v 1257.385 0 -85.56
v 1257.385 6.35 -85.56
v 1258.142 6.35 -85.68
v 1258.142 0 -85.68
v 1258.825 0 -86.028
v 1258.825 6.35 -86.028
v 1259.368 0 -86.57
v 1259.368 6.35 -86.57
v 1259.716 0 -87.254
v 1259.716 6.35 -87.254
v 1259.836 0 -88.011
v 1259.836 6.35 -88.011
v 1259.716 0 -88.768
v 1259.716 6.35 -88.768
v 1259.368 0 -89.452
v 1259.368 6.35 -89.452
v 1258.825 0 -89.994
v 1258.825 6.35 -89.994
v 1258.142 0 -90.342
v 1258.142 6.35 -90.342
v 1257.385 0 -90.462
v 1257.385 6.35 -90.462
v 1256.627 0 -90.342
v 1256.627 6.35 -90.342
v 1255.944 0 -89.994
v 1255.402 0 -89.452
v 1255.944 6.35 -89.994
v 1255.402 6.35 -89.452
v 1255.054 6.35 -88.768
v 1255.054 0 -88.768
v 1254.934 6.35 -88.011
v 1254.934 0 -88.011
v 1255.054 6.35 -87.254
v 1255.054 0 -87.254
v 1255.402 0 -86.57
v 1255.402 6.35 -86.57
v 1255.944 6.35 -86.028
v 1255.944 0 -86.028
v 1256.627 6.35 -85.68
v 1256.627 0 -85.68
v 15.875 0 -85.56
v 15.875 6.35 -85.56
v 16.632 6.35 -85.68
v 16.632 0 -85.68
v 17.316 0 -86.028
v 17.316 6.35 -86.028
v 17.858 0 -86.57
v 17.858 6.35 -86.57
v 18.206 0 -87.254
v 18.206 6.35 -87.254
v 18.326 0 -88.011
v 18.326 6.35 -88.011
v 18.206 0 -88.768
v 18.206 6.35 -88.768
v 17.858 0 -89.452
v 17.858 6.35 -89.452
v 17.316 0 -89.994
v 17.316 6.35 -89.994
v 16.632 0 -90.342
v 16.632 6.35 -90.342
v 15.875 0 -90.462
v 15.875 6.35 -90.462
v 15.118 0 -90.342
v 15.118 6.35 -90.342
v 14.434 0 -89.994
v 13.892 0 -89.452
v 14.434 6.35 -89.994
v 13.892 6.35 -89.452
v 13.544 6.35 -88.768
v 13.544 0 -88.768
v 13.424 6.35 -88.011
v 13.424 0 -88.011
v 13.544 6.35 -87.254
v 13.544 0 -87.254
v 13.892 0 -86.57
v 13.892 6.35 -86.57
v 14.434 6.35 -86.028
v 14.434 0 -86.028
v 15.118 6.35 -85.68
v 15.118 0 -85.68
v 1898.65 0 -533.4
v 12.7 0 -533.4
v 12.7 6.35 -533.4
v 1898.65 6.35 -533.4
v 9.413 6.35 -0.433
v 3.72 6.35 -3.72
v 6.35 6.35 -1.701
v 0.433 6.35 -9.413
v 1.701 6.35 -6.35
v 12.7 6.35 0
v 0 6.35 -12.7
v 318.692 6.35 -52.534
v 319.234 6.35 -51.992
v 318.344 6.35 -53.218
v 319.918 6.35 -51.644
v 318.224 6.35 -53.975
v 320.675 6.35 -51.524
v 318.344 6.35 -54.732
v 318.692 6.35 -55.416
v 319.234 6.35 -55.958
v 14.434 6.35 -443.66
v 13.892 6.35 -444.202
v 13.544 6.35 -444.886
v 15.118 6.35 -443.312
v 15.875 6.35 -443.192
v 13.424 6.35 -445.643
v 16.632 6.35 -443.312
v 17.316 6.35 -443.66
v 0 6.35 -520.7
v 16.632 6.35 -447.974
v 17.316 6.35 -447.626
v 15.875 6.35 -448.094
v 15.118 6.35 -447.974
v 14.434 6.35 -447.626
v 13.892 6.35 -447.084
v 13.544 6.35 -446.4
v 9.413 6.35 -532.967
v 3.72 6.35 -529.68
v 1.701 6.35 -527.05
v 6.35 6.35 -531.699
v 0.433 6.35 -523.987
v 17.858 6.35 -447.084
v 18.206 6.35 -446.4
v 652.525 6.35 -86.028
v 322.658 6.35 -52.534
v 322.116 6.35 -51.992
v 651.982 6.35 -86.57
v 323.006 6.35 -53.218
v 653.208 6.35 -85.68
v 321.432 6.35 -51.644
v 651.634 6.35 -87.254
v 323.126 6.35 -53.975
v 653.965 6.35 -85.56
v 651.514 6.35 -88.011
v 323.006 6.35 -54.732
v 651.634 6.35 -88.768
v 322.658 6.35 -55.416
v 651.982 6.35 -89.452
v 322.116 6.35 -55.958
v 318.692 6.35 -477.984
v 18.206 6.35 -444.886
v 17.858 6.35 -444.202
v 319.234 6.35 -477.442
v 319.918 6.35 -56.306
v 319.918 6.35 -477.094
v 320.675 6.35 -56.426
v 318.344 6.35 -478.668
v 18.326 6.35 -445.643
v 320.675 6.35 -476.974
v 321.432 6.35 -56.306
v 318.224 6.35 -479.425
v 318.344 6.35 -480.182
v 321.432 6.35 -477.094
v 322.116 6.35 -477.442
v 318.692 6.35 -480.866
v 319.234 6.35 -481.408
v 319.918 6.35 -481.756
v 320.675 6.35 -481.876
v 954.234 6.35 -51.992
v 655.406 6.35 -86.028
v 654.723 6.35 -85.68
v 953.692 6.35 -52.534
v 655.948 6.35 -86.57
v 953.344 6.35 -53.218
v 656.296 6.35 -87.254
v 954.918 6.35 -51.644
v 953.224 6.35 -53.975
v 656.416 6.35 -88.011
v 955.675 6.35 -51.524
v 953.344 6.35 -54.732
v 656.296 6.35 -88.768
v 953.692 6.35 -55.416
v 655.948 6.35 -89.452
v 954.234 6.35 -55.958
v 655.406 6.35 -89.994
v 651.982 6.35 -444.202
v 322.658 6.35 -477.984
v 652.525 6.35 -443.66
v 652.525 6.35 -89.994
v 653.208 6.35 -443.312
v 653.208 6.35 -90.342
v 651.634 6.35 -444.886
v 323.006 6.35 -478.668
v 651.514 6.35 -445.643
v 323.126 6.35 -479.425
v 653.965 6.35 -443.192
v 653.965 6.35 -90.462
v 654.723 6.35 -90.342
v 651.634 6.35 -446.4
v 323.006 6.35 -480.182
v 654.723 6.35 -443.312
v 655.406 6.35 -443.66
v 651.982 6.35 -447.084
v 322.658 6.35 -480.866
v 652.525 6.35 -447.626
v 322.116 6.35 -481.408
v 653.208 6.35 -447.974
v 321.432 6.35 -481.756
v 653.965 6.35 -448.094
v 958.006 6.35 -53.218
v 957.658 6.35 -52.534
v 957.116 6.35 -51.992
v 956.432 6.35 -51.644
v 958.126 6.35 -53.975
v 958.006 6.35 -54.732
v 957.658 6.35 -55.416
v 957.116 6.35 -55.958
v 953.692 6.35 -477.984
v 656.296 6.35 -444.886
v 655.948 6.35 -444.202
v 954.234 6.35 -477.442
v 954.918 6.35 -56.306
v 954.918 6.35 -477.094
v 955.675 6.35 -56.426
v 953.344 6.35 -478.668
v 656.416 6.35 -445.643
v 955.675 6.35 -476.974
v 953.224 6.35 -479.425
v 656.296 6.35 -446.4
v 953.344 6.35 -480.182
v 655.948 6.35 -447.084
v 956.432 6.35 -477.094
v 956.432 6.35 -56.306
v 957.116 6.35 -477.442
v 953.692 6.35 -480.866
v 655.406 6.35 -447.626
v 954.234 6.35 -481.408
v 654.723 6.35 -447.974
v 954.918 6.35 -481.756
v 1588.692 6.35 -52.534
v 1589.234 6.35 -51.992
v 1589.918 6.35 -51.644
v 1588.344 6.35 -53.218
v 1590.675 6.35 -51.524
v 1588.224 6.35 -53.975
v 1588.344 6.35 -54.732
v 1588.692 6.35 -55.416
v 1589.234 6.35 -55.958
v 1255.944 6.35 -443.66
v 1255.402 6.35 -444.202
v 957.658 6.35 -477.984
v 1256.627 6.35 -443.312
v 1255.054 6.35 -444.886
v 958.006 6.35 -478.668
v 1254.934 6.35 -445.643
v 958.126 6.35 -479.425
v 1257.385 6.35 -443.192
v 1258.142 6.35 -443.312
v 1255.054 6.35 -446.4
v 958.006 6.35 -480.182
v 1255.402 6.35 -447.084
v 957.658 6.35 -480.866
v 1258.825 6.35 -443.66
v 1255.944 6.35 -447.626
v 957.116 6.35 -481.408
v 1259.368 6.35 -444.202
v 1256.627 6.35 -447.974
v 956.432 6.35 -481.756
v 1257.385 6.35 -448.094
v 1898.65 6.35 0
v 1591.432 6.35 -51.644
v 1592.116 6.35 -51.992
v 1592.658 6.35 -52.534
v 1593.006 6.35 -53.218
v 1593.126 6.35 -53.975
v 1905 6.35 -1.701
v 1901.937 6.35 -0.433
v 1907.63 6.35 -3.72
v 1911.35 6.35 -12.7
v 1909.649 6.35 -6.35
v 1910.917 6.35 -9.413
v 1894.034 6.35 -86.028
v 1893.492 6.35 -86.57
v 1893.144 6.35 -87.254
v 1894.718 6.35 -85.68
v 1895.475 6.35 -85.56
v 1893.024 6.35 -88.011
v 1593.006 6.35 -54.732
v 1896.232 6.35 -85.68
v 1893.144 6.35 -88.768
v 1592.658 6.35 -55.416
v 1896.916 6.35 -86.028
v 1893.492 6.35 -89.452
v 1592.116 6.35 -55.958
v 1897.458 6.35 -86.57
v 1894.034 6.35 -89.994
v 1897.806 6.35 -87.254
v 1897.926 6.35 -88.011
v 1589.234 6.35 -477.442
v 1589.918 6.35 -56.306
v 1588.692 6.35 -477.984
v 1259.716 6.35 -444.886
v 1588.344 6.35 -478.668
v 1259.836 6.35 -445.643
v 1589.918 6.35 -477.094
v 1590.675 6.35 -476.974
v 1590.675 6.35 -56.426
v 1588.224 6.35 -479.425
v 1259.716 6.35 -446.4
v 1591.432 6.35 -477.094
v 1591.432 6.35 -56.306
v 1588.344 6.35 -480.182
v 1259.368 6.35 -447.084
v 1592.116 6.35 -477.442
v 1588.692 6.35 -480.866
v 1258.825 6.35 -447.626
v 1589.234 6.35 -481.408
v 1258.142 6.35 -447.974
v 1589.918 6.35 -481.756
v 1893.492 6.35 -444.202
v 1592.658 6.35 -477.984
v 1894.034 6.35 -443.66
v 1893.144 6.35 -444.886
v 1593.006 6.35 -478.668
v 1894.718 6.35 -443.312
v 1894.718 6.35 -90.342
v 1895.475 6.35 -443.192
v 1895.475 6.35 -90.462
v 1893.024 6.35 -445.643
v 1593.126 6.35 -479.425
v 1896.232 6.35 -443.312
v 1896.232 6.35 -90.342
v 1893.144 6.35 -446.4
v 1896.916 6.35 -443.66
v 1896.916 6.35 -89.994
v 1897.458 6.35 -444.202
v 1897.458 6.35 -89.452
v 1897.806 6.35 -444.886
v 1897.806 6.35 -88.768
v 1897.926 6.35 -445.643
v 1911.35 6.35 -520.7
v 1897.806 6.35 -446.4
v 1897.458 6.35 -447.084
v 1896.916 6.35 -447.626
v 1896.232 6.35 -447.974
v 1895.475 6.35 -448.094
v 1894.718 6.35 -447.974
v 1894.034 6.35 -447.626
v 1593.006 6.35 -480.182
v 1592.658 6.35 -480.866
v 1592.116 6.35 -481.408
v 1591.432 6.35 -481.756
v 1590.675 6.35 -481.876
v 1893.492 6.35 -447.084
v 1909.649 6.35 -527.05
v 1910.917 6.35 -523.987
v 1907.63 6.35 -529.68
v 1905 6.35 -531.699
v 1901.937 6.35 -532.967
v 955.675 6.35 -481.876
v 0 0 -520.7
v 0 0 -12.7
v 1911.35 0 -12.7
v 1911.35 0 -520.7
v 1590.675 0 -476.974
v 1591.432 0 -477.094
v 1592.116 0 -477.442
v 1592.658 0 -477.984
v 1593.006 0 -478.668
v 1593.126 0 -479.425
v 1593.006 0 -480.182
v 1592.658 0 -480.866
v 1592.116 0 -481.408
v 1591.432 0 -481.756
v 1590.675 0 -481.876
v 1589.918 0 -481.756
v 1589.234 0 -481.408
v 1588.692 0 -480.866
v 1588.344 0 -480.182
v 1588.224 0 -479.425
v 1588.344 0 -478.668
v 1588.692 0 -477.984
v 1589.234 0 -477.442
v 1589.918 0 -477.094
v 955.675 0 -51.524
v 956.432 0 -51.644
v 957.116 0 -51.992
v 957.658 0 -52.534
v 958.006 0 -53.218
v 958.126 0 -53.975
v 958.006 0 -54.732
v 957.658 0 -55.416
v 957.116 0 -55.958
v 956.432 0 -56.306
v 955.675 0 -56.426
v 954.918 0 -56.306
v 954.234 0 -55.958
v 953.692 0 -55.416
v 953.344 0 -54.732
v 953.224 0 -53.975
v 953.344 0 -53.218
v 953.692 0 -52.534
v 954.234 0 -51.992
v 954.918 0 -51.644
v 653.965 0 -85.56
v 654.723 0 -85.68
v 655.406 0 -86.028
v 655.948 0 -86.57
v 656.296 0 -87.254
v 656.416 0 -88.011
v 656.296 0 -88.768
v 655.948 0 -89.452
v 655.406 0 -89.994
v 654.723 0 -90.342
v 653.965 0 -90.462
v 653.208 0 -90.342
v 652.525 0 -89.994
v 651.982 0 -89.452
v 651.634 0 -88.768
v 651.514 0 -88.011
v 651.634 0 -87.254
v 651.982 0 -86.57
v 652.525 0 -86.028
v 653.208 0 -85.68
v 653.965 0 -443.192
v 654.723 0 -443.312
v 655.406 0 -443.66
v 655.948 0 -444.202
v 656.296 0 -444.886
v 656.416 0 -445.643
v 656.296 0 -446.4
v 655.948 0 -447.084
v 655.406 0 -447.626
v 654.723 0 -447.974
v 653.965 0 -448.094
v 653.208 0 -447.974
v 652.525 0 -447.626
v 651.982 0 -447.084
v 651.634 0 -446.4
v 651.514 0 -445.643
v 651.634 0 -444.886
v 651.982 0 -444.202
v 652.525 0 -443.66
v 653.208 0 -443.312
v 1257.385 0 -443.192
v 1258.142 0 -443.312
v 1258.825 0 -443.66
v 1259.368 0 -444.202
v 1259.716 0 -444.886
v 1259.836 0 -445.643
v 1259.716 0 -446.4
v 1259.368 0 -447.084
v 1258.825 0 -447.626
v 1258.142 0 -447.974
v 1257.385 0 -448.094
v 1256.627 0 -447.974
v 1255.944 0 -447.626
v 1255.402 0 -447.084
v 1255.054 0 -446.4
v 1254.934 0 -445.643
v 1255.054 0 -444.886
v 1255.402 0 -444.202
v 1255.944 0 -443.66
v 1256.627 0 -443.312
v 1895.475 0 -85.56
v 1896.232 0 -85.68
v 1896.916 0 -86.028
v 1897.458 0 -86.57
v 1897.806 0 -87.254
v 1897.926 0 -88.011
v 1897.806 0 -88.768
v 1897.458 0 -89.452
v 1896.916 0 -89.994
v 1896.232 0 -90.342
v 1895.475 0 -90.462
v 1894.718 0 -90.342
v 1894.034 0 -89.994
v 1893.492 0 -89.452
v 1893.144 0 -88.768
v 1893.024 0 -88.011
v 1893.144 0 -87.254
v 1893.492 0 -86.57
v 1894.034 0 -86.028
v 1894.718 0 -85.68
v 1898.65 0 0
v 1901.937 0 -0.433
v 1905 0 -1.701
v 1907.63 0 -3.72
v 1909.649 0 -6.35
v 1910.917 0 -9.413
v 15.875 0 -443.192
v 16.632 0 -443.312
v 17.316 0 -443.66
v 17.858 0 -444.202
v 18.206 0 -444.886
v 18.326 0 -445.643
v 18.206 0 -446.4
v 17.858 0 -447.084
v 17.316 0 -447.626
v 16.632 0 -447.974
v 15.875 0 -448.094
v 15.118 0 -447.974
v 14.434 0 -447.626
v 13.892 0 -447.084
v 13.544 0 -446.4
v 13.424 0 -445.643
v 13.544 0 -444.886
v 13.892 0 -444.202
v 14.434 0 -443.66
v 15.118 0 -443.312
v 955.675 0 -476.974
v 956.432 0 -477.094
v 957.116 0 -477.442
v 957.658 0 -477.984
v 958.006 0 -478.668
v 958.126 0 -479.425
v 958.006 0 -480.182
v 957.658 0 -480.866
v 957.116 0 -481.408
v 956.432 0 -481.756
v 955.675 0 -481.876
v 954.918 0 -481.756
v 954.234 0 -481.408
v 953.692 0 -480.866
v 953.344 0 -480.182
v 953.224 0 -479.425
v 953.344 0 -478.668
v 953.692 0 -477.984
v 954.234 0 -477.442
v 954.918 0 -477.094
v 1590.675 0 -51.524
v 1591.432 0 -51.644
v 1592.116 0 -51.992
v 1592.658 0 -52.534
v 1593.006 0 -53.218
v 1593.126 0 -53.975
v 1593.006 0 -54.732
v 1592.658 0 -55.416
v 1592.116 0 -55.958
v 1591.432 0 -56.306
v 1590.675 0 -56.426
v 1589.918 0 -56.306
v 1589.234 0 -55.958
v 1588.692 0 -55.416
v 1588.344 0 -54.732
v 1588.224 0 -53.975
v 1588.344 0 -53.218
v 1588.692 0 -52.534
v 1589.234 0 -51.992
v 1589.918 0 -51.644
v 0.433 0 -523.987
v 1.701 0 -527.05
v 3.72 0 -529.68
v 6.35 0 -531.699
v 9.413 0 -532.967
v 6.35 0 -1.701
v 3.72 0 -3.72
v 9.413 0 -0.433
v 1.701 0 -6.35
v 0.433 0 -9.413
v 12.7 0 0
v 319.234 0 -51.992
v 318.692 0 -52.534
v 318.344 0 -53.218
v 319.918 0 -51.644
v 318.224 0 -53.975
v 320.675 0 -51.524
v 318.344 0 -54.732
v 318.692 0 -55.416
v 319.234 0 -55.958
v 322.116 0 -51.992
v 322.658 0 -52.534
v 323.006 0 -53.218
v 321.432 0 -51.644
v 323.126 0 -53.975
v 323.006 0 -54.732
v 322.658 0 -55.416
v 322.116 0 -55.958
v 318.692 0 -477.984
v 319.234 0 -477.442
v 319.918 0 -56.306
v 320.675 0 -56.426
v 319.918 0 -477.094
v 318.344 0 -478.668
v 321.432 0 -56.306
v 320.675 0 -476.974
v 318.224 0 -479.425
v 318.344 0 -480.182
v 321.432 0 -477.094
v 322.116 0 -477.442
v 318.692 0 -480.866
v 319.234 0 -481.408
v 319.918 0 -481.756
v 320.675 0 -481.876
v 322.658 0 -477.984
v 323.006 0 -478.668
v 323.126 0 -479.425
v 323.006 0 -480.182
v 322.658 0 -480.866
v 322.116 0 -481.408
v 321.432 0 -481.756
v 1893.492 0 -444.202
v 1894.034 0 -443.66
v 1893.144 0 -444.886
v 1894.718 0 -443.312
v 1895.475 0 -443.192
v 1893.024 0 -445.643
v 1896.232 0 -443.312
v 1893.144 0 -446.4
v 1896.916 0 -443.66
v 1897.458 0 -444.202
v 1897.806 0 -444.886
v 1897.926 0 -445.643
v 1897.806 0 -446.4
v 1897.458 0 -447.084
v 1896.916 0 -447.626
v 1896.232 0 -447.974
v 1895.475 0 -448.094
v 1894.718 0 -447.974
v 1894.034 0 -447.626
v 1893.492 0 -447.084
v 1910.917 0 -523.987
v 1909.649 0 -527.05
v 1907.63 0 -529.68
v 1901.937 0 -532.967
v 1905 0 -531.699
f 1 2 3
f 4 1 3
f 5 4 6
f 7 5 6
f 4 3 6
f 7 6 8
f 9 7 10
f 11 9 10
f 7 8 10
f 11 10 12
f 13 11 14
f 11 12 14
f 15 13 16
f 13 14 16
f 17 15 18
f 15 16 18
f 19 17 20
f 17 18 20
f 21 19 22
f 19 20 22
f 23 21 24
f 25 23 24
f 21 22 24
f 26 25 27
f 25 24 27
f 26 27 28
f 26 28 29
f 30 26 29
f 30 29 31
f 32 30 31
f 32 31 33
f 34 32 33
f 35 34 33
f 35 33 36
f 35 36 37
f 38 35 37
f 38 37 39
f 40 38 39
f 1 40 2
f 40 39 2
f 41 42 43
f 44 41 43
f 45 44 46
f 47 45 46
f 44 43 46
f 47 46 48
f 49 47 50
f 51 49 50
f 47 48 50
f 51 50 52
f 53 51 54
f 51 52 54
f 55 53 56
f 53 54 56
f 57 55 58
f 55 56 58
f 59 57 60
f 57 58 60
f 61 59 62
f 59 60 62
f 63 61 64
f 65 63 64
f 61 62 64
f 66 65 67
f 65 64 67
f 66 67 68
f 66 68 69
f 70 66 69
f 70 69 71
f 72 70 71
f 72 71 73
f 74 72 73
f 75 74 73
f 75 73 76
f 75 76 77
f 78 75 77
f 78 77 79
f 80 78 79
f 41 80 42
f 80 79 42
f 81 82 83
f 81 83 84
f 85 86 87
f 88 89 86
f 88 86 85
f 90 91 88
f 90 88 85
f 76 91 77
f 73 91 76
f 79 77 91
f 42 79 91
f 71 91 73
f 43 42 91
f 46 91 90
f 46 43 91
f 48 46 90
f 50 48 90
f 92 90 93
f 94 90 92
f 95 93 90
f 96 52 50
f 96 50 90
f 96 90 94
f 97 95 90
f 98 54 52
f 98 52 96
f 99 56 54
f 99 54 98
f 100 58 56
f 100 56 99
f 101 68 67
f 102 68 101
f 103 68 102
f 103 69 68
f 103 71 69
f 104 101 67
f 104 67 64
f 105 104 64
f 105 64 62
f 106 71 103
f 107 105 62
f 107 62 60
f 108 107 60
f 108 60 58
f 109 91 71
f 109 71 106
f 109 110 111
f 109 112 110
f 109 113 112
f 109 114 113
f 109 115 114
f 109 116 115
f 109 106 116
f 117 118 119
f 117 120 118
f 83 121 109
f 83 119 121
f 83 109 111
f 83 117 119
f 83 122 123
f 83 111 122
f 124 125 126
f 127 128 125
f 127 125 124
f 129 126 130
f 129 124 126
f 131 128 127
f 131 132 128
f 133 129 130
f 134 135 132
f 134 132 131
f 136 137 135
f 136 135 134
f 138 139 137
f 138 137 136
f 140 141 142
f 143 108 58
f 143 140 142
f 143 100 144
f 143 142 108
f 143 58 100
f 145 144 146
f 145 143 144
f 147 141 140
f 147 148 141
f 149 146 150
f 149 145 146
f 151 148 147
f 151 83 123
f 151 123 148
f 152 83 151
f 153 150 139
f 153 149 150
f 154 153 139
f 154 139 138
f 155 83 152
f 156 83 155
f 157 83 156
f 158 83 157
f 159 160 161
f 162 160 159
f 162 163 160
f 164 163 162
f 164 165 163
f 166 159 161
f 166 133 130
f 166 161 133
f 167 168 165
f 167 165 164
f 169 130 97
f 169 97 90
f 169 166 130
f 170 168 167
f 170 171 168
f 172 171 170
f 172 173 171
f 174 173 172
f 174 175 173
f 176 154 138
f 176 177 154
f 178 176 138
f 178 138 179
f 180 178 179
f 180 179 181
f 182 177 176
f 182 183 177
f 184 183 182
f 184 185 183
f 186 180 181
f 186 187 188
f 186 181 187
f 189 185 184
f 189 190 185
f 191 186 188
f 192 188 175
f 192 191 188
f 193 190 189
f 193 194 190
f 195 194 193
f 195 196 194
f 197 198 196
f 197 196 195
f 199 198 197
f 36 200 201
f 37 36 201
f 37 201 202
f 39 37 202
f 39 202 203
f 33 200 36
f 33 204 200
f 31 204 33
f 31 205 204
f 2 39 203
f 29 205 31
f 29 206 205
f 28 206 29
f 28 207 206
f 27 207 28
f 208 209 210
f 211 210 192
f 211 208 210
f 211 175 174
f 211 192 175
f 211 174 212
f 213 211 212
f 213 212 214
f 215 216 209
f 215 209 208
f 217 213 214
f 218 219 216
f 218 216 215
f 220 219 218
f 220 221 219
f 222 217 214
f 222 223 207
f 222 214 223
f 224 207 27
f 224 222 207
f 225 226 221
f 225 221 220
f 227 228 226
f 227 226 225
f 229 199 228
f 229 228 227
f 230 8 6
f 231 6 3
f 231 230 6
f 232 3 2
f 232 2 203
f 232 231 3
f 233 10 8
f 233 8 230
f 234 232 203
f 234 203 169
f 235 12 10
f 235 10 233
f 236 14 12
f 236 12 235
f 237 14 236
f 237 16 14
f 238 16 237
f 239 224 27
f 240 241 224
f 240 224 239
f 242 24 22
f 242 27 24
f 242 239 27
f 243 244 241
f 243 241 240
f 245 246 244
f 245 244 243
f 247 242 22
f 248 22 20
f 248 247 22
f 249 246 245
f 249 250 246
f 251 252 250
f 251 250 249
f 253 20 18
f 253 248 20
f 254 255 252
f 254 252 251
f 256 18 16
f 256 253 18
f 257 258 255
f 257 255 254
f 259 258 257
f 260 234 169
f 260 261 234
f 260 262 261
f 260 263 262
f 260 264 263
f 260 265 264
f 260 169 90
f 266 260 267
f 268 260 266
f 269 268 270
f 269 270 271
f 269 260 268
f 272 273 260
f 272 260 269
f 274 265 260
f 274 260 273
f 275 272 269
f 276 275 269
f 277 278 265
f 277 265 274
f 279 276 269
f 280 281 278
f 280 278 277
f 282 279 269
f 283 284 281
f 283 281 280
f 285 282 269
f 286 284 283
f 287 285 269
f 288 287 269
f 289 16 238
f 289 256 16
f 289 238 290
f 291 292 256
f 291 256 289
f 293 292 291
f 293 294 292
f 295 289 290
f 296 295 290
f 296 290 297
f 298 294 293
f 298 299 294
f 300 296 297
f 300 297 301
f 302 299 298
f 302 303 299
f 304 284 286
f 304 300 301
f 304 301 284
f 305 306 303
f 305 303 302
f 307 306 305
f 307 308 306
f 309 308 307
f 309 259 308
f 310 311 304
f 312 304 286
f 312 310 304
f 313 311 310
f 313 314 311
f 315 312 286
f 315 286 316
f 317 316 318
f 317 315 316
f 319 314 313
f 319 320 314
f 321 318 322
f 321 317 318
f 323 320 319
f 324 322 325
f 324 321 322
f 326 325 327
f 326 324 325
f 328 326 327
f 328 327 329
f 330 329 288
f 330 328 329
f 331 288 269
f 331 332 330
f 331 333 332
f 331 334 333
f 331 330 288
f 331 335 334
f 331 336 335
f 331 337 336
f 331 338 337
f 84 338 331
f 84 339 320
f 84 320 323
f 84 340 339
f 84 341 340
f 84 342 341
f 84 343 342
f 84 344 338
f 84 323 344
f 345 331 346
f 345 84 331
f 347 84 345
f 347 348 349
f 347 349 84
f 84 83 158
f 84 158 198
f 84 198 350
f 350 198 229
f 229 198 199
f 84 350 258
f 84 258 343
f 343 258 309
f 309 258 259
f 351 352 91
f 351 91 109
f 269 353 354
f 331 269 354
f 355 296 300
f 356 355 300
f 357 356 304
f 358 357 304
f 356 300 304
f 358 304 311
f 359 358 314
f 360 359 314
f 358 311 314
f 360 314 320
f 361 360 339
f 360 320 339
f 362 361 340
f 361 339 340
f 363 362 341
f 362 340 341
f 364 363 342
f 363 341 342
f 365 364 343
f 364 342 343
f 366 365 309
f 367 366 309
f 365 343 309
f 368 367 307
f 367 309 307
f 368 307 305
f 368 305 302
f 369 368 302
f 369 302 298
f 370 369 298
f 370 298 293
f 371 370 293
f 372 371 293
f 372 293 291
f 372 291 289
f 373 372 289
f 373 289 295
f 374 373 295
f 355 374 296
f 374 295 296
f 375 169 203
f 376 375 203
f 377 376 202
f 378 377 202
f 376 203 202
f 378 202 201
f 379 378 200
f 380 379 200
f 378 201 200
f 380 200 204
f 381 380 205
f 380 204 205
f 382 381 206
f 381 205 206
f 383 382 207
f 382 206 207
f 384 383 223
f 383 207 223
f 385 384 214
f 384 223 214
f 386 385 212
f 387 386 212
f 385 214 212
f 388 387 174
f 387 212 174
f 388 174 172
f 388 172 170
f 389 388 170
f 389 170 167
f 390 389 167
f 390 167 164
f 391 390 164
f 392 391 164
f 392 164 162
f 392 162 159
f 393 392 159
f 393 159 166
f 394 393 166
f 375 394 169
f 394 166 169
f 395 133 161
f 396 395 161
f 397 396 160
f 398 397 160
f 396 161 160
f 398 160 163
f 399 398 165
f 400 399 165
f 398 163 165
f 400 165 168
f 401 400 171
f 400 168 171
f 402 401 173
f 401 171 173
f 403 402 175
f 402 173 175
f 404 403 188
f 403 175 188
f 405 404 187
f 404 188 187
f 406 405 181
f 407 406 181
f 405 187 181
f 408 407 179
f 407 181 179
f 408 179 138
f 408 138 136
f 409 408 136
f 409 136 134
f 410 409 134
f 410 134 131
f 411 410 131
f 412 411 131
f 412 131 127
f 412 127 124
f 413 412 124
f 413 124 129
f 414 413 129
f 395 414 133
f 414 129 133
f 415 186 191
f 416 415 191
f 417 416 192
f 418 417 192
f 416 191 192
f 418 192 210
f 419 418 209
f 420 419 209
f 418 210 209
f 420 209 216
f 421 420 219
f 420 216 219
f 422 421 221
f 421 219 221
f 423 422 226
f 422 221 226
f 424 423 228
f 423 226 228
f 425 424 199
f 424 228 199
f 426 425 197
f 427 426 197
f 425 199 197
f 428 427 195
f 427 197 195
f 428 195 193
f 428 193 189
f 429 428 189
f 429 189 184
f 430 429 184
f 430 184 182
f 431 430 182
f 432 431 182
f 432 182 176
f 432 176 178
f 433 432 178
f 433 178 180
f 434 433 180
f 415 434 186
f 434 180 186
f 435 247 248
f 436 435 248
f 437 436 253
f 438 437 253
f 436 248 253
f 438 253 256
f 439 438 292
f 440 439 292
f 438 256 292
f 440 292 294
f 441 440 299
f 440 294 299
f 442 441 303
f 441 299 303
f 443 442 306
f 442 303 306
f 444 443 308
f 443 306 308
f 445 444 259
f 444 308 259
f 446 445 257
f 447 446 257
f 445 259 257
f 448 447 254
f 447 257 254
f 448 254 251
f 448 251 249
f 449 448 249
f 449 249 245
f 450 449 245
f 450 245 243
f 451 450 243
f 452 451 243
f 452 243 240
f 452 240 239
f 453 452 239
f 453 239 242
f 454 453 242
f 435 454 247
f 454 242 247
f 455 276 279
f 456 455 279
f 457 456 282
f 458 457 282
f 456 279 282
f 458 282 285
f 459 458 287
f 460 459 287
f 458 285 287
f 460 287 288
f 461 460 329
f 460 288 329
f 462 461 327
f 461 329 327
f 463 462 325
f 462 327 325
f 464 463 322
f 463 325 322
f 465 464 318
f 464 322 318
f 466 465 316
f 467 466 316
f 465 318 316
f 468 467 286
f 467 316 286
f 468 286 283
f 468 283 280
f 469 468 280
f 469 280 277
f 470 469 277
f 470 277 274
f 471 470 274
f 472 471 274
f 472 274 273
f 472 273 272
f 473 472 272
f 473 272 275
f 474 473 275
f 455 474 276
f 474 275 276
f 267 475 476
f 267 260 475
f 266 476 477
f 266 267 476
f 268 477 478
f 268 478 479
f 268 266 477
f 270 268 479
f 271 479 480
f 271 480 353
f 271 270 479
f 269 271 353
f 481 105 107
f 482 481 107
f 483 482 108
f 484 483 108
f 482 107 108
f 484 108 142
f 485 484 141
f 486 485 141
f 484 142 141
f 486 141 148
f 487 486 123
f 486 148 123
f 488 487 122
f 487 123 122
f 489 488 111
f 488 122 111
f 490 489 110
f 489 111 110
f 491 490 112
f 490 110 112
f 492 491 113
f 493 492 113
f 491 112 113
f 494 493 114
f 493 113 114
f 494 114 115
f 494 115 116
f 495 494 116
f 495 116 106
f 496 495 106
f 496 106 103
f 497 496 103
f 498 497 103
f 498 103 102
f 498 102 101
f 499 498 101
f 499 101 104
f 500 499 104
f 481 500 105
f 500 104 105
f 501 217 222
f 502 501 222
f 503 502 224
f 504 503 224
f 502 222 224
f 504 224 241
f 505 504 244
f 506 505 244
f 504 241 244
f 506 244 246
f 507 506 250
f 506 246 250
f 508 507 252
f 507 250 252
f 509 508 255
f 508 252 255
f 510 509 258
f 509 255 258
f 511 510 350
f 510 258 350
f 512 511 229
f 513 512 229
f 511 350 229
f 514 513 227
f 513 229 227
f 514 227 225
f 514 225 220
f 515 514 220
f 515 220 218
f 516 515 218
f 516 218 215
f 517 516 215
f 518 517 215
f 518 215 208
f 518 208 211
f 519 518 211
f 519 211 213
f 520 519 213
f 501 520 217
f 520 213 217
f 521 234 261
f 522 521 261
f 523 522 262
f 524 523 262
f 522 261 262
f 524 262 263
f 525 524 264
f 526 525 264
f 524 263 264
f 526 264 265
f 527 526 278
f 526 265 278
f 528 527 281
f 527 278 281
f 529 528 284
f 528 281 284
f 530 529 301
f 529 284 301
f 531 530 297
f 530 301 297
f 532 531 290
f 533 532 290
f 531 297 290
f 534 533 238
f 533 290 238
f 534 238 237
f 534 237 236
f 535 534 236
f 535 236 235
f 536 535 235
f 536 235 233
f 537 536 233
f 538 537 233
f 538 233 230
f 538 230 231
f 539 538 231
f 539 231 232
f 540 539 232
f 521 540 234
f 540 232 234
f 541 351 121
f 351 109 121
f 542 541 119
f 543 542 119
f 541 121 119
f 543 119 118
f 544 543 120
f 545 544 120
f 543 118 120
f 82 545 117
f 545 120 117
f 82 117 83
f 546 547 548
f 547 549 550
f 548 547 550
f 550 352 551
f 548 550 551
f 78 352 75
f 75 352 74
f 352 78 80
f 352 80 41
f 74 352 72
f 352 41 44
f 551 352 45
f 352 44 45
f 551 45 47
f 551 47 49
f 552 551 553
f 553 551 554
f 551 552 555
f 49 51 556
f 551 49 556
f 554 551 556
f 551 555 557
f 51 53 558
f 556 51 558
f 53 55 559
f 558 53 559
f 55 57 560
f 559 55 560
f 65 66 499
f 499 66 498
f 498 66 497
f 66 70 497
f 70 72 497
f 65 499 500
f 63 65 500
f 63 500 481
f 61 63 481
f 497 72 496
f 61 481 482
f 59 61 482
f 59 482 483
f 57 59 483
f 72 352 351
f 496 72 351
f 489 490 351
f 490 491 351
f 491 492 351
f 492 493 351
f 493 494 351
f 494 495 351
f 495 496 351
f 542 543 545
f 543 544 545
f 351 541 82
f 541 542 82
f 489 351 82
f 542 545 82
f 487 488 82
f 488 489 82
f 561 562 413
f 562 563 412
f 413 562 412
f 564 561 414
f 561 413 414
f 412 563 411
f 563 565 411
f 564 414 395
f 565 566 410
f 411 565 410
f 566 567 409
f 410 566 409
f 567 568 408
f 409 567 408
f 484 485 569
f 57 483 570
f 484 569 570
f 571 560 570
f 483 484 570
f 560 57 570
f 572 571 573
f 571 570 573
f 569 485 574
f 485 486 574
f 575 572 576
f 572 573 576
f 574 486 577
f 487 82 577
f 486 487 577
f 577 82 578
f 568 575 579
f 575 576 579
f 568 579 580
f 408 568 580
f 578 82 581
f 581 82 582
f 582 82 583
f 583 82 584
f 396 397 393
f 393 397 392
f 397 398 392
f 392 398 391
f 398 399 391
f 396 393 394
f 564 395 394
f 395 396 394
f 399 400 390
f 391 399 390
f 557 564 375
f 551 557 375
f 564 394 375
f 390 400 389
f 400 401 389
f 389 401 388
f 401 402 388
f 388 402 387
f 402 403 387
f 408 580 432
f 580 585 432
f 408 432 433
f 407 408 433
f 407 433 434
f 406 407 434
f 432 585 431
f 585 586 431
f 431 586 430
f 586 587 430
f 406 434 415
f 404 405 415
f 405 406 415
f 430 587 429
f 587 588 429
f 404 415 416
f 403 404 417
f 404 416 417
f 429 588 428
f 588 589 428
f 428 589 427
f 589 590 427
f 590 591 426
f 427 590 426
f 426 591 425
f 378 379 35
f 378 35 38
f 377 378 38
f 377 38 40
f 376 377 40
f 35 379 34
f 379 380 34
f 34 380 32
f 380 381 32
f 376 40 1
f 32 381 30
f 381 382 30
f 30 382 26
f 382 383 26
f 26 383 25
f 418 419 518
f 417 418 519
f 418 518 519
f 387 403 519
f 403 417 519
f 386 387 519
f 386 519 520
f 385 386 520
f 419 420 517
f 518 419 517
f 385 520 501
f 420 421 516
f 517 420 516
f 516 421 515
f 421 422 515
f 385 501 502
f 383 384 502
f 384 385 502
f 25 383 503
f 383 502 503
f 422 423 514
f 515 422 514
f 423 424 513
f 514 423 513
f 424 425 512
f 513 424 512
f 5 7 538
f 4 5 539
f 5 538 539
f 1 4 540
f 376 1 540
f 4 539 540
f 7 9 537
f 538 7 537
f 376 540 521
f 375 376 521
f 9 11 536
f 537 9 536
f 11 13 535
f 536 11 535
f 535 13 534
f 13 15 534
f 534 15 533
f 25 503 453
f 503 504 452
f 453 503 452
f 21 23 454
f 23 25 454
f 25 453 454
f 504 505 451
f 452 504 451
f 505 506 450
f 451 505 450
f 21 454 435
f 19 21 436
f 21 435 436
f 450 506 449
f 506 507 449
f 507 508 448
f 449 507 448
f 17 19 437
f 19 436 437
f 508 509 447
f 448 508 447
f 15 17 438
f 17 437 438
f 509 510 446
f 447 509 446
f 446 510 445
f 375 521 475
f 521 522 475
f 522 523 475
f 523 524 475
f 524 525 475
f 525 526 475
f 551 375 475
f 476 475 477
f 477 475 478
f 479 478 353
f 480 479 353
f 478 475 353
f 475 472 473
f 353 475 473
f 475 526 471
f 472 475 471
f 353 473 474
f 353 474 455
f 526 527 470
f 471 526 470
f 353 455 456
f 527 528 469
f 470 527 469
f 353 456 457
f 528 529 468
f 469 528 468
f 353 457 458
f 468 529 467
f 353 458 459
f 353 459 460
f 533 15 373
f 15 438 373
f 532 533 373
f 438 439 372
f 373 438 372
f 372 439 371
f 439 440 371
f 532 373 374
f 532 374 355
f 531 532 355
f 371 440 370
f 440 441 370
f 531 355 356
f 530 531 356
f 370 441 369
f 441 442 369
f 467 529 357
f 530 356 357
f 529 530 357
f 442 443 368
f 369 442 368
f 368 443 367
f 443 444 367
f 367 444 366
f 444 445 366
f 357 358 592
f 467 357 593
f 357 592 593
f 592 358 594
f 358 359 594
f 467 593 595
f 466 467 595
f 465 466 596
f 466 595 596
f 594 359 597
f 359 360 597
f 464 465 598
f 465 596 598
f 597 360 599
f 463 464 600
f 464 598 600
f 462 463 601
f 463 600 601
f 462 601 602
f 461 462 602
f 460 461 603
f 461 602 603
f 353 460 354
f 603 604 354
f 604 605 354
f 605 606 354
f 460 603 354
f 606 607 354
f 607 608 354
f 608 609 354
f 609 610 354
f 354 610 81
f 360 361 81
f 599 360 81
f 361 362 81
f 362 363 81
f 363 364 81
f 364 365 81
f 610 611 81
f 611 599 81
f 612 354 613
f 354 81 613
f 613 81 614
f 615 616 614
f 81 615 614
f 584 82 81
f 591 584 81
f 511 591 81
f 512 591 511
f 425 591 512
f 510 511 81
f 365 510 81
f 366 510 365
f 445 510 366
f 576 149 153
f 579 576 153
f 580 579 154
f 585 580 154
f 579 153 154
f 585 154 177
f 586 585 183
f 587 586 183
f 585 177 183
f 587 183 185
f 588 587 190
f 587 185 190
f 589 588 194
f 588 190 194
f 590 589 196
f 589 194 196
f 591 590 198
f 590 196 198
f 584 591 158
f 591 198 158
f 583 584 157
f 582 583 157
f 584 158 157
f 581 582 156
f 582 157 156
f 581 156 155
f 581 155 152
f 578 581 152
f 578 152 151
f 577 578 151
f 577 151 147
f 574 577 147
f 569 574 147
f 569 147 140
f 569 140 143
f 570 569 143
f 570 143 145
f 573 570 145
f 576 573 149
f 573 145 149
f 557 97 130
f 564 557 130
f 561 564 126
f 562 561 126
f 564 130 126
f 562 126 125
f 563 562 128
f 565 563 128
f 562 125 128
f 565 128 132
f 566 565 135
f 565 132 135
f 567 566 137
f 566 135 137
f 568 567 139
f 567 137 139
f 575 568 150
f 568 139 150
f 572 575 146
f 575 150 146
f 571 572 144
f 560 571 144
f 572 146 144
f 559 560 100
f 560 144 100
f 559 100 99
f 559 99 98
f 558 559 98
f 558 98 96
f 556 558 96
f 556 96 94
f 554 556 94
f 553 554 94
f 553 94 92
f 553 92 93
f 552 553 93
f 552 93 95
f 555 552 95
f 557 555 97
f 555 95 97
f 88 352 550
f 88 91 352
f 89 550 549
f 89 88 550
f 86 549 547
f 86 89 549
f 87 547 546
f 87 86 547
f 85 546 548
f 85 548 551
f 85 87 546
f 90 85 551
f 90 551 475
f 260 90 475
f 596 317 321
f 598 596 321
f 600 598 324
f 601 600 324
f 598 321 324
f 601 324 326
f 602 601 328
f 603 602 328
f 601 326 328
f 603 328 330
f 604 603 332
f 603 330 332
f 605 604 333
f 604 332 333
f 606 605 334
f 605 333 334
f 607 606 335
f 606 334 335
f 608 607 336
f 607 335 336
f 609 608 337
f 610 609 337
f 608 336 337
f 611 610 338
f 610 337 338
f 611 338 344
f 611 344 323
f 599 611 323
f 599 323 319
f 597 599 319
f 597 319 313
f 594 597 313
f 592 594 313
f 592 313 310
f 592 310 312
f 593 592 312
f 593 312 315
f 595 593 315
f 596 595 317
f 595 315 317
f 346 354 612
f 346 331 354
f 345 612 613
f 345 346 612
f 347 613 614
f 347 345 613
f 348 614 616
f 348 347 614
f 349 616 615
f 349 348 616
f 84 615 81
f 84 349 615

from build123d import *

# Parameters (mm, degrees)
SKETCH1_W           = 1911.35
SKETCH1_H           = 533.4
BOSS_EXTRUDE1_DEPTH = 6.35
FILLET1_R           = 12.7
SKETCH2_R           = 2.4511
CUT_EXTRUDE1_DEPTH  = 6.35
SKETCH7_R           = 2.4511
CUT_EXTRUDE2_DEPTH  = 6.35


with BuildPart() as part:
    # Sketch1 → Boss-Extrude1 (new body)
    with BuildSketch(Plane(origin=(0, 0, 0), x_dir=(1, 0, 0), z_dir=(0, 1, 0))):
        with Locations((955.675, 266.7)):
            Rectangle(SKETCH1_W, SKETCH1_H)
    extrude(amount=BOSS_EXTRUDE1_DEPTH)

    # Fillet1
    fillet1_edges = [part.edges().sort_by_distance(p)[0] for p in [
        (0, 3.175, -533.4),
        (1911.35, 3.175, -533.4),
        (1911.35, 3.175, 0),
        (0, 3.175, 0),
    ]]
    fillet(fillet1_edges, radius=FILLET1_R)

    # Sketch2 → Cut-Extrude1 (cut)
    with BuildSketch(Plane(origin=(0, 6.35, 0), x_dir=(1, 0, 0), z_dir=(0, 1, 0))):
        with Locations(Location((15.875, 445.643, 0), (0, 0, 270))):
            Circle(SKETCH2_R)
        with Locations(Location((653.965333418, 445.643, 0), (0, 0, 270))):
            Circle(SKETCH2_R)
        with Locations(Location((653.965333418, 88.011, 0), (0, 0, 270))):
            Circle(SKETCH2_R)
        with Locations(Location((15.875, 88.011, 0), (0, 0, 270))):
            Circle(SKETCH2_R)
        with Locations(Location((1257.384666582, 445.643, 0), (0, 0, 270))):
            Circle(SKETCH2_R)
        with Locations(Location((1257.384666582, 88.011, 0), (0, 0, 270))):
            Circle(SKETCH2_R)
        with Locations(Location((1895.475, 445.643, 0), (0, 0, 270))):
            Circle(SKETCH2_R)
        with Locations(Location((1895.475, 88.011, 0), (0, 0, 270))):
            Circle(SKETCH2_R)
    extrude(amount=-CUT_EXTRUDE1_DEPTH, mode=Mode.SUBTRACT)

    # Sketch7 → Cut-Extrude2 (cut)
    with BuildSketch(Plane(origin=(0, 6.35, 0), x_dir=(1, 0, 0), z_dir=(0, 1, 0))):
        with Locations(Location((320.675, 479.425, 0), (0, 0, 270))):
            Circle(SKETCH7_R)
        with Locations(Location((320.675, 53.975, 0), (0, 0, 270))):
            Circle(SKETCH7_R)
        with Locations(Location((955.675, 53.975, 0), (0, 0, 270))):
            Circle(SKETCH7_R)
        with Locations(Location((955.675, 479.425, 0), (0, 0, 270))):
            Circle(SKETCH7_R)
        with Locations(Location((1590.675, 479.425, 0), (0, 0, 270))):
            Circle(SKETCH7_R)
        with Locations(Location((1590.675, 53.975, 0), (0, 0, 270))):
            Circle(SKETCH7_R)
    extrude(amount=-CUT_EXTRUDE2_DEPTH, mode=Mode.SUBTRACT)


solid = part.part
